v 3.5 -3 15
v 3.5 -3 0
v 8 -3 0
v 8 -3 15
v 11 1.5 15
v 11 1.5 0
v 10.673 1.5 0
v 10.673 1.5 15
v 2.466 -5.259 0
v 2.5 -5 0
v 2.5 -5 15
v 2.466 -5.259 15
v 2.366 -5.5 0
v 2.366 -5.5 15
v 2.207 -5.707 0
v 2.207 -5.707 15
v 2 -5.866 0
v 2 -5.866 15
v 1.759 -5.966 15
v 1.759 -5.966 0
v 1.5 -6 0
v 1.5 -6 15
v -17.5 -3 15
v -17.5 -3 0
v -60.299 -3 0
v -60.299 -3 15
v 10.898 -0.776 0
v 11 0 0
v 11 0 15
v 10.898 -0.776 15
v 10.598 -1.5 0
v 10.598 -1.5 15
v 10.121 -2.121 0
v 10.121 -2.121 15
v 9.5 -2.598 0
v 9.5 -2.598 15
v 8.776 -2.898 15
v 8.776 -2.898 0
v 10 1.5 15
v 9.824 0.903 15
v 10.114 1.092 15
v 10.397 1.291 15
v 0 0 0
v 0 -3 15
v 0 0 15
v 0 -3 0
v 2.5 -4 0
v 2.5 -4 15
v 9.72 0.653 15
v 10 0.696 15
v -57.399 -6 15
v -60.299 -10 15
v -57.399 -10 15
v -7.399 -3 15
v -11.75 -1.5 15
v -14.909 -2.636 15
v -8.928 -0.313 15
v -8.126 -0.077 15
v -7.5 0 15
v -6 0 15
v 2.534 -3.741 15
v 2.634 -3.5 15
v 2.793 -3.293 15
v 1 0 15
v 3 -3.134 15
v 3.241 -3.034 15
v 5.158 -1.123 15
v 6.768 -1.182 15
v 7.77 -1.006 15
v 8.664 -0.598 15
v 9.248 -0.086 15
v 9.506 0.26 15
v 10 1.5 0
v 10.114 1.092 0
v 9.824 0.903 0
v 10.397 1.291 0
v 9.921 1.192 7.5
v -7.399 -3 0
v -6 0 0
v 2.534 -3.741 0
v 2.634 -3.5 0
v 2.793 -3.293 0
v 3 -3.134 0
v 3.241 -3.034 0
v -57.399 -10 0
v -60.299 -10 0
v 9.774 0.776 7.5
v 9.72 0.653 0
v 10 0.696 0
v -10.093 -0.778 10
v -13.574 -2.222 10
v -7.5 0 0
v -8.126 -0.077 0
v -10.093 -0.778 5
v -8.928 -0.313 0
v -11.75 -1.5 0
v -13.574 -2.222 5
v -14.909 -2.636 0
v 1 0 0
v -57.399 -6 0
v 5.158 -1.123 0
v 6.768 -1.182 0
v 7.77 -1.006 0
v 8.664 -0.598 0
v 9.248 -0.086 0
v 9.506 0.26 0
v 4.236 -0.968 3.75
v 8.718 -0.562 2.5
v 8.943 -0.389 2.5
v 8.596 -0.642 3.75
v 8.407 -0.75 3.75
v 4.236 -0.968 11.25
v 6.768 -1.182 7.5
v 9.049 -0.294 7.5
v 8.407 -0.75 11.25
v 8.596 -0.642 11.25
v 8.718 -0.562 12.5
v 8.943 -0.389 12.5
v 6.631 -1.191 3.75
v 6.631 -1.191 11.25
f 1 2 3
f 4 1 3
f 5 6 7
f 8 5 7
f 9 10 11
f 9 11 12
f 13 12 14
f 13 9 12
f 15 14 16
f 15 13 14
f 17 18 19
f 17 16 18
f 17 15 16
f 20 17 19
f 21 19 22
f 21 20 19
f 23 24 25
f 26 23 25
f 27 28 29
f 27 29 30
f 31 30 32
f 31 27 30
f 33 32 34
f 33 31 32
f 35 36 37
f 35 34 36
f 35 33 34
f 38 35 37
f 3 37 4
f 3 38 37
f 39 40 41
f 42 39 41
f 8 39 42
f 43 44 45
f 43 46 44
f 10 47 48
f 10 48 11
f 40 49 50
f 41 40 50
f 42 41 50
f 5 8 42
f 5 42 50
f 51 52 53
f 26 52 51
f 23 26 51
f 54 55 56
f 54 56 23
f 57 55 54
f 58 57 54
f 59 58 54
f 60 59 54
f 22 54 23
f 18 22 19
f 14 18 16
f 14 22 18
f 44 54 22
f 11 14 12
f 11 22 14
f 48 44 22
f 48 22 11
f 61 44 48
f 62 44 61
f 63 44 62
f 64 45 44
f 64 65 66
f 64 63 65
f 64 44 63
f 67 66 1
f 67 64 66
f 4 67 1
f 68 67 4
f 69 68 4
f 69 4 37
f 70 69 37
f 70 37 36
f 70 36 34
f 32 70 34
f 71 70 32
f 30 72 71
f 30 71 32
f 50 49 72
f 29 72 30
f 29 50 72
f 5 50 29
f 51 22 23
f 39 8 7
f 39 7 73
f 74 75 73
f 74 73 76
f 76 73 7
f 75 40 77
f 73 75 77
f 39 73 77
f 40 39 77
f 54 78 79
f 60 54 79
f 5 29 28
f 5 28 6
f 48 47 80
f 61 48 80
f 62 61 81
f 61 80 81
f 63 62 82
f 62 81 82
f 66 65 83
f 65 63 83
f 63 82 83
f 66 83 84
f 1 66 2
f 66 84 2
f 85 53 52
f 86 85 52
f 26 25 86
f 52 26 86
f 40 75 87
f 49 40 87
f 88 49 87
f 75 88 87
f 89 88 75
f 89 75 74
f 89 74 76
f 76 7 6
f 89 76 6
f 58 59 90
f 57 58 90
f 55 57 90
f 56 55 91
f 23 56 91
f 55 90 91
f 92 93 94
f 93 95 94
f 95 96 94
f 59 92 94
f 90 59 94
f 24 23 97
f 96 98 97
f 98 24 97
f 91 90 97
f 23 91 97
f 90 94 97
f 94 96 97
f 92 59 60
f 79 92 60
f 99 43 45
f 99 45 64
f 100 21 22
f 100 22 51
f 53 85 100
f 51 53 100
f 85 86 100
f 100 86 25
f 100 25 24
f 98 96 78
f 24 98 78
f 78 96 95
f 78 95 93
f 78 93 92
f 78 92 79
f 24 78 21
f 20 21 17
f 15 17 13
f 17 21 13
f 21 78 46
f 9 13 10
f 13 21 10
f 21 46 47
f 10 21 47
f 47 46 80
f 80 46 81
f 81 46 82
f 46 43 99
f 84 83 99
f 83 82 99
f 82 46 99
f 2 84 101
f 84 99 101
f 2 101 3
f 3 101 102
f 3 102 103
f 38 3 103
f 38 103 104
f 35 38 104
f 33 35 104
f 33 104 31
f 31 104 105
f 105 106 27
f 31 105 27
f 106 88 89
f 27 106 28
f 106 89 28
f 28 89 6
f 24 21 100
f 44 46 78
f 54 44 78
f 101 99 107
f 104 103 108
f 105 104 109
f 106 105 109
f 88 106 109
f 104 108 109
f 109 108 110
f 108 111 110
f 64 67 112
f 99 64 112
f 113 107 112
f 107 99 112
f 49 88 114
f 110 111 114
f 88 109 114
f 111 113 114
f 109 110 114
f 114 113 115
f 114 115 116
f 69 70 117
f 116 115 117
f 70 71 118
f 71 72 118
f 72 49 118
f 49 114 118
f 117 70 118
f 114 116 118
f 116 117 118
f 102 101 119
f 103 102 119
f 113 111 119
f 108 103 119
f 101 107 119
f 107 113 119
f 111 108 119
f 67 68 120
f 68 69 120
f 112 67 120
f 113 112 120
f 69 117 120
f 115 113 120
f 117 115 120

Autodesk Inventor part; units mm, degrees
ref_plane "YZ Plane" through (0, 0, 0) normal (1, 0, 0) x (0, 1, 0)
ref_plane "XZ Plane" through (0, 0, 0) normal (0, 1, 0) x (-1, 0, 0)
ref_plane "XY Plane" through (0, 0, 0) normal (0, 0, 1) x (1, 0, 0)
sketch "Эскиз1" plane through (0, 0, 0) normal (0, 0, 1) x (1, 0, 0)
  line L0 (0, 0) -> (1, 0)
  line L1 (9, 0) -> (9, -3) construction
  line L2 (9, -3) -> (3.5, -3) construction
  line L3 (0, -3) -> (0, 0)
  line L4 (0, -3) -> (-7.3989, -3)
  line L5 (-7.3989, -3) -> (-7.3989, -6) construction
  line L6 (-7.3989, -6) -> (0, -6)
  line L7 (0, -6) -> (0, -3) construction
  line L8 (0, -3) -> (2.5, -3) construction
  line L9 (2.5, -4) -> (2.5, -5)
  line L10 (1.5, -6) -> (0, -6)
  line L11 (0, -6) -> (0, -3) construction
  line L12 (-7.3989, -3) -> (-6, 0)
  line L13 (-7.3989, -3) -> (-13.5, -3) construction
  line L14 (-57.3989, -3) -> (-57.3989, -6) construction
  line L15 (-57.3989, -6) -> (-7.3989, -6)
  line L16 (-7.3989, -6) -> (-7.3989, -3) construction
  arc A0 (1.5, -6) -> (2.5, -5) centre (1.5, -5) ccw
  arc A1 (3.5, -3) -> (2.5, -4) centre (3.5, -4) ccw
  line L17 (-13.5, -3) -> (-17.5, -3) construction
  line L18 (0, 0) -> (1, 0)
  line L19 (9, 0) -> (8, 0) construction
  arc A2 (1, 0) -> (8, 0) centre (4.5, 9.3675) ccw construction
  line L20 (-57.3989, -3) -> (-60.2989, -3)
  line L21 (-60.2989, -3) -> (-60.2989, -13)
  line L22 (-60.2989, -13) -> (-57.3989, -13) construction
  line L23 (-57.3989, -13) -> (-57.3989, -10) construction
  line L24 (-57.3989, -13) -> (8.6011, -13)
  line L25 (8.6011, -13) -> (8.6011, -10)
  line L26 (8.6011, -10) -> (-57.3989, -10)
  line L27 (-57.3989, -10) -> (-57.3989, -13) construction
  line L28 (-57.3989, -6) -> (-57.3989, -3) construction
  line L29 (-57.3989, -10) -> (-57.3989, -6)
  line L30 (-13.5, -3) -> (-17.5, -3) construction
  line L31 (-17.5, -3) -> (-57.3989, -3)
  line L32 (1, 0) -> (8, 0) construction
  line L33 (8, 0) -> (9, 0) construction
  line L34 (-57.3989, -13) -> (-60.2989, -13)
  line L35 (-60.2989, -13) -> (-60.2989, -13) construction
  line L36 (-6, 0) -> (-7.5, 0) construction
  line L37 (-7.5, 0) -> (-7.5, -3) construction
  line L38 (-7.5, 0) -> (-9.5, 0) construction
  line L39 (-7.5, 0) -> (-9.5, 0) construction
  line L40 (-9.5, 0) -> (-13.5, -3) construction
  line L41 (-13.5, -3) -> (-17.5, -3) construction
  spline S0 degree 3 poles (-7.5, 0) (-9.5, 0) (-13.5, -3) (-17.5, -3) knots 1 1 1 1 2 2 2 2
  line L42 (-7.5, 0) -> (-6, 0)
  line L43 (9, -3) -> (11, -3) construction
  line L44 (11, 0) -> (11, 1.5)
  line L45 (11, 1.5) -> (10.6727, 1.5)
  arc A3 (1, 0) -> (10.6727, 1.5) centre (4.5, 9.3675) ccw
  line L46 (3.5, -3) -> (8, -3)
  arc A4 (8, -3) -> (11, 0) centre (8, 0) ccw
  point P0 (2.5, -6)
  point P1 (0, -6)
  point P2 (2, -4)
  dimension "d0" = 9
  dimension "d1" = 3
  dimension "d3" = 3
  dimension "d4" = 2.5
  dimension "d5" = 3
  dimension "d6" = 50
  dimension "d9" = 1
  dimension "d10" = 1
  dimension "d11" = 4
  dimension "d13" = 3
  dimension "d14" = 1
  dimension "d15" = 1
  dimension "d16" = 10
  dimension "d17" = 2.9
  dimension "d18" = 10
  dimension "d20" = 3
  dimension "d21" = 66
  dimension "d25" = 4
  dimension "d26" = 66
  dimension "d27" = 90
  dimension "d28" = 90
  dimension "d29" = 65
  dimension "d30" = 6
  dimension "d31" = 3
  dimension "d32" = 1.5
  dimension "d33" = 6
  dimension "d34" = 2
  dimension "d37" = 2
  dimension "d38" = 4.5
  dimension "d39" = 3
  dimension "d40" = 2.9
extrude "Выдавливание1" add sketch "Эскиз1" along normal blind 15
sketch "Эскиз3" plane through (0, 0, 15) normal (0, 0, 1) x (1, 0, 0)
  line L0 (-57.3989, -6) -> (1.5, -6) construction
  arc A0 (1.5, -6) -> (2.5, -5) centre (1.5, -5) ccw construction
  arc A1 (3.5, -3) -> (2.5, -4) centre (3.5, -4) ccw construction
  line L1 (1, 0) -> (0, 0) construction
  line L2 (0, 0) -> (0, -3) construction
  line L3 (0, -3) -> (-7.3989, -3) construction
  line L4 (-7.3989, -3) -> (-6, 0) construction
  line L5 (-6, 0) -> (-7.5, 0) construction
  line L6 (-17.5, -3) -> (-60.2989, -3) construction
  line L7 (-60.2989, -3) -> (-60.2989, -13) construction
  line L8 (-60.2989, -13) -> (8.6011, -13) construction
  line L9 (8.6011, -13) -> (8.6011, -10) construction
  line L10 (8.6011, -10) -> (-57.3989, -10) construction
  line L11 (-57.3989, -10) -> (-57.3989, -6) construction
  line L12 (8.6011, -10) -> (-57.3989, -10) construction
  line L13 (-57.3989, -10) -> (-60.2989, -10)
  line L14 (-57.3989, -10) -> (11.5916, -5.7468)
  line L15 (11.5916, -5.7468) -> (11.9856, -17.8215)
  line L16 (11.9856, -17.8215) -> (-64.6581, -17.3068)
  line L17 (-64.6581, -17.3068) -> (-62.6934, -10.3264)
  line L18 (-62.6934, -10.3264) -> (-60.2989, -10)
  line L19 (2.5, -5) -> (2.5, -4) projected
  line L20 (3.5, -3) -> (8, -3) projected
  arc A2 (8, -3) -> (11, 0) centre (8, 0) ccw projected
  line L21 (11, 0) -> (11, 1.5) projected
  line L22 (11, 1.5) -> (10.6727, 1.5) projected
  arc A3 (1, 0) -> (10.6727, 1.5) centre (4.5, 9.3675) ccw projected
extrude "Выдавливание2" cut sketch "Эскиз3" against normal blind 25
sketch "Эскиз4" plane through (0, 0, 15) normal (0, 0, 1) x (1, 0, 0)
  line L0 (-60.2989, -10) -> (-57.3989, -10) construction
  line L1 (-57.3989, -10) -> (-57.3989, -6) construction
  line L2 (-57.3989, -6) -> (1.5, -6) construction
  arc A0 (1.5, -6) -> (2.5, -5) centre (1.5, -5) ccw construction
  line L3 (2.5, -5) -> (2.5, -4) construction
  arc A1 (3.5, -3) -> (2.5, -4) centre (3.5, -4) ccw construction
  line L4 (3.5, -3) -> (8, -3) construction
  arc A2 (8, -3) -> (11, 0) centre (8, 0) ccw construction
  line L5 (11, 0) -> (11, 1.5) construction
  line L6 (11, 1.5) -> (10.6727, 1.5) construction
  arc A3 (1, 0) -> (10.6727, 1.5) centre (4.5, 9.3675) ccw construction
  line L7 (1, 0) -> (0, 0) construction
  line L8 (0, 0) -> (0, -3) construction
  line L9 (0, -3) -> (-7.3989, -3) construction
  line L10 (-7.3989, -3) -> (-6, 0) construction
  line L11 (-6, 0) -> (-7.5, 0) construction
  line L12 (-17.5, -3) -> (-60.2989, -3) construction
  line L13 (-60.2989, -3) -> (-60.2989, -10) construction
  arc A4 (1, 0) -> (10.6727, 1.5) centre (4.5, 9.3675) ccw construction
  line L14 (1, 0) -> (9, -3) construction
  line L15 (9, -3) -> (10.6727, 1.5) construction
  spline S0 degree 2 poles (1, 0) (9, -3) (10.6727, 1.5) knots 1 1 1 2 2 2 construction
  line L16 (1, 0) -> (10.6727, 1.5) construction
  line L17 (11, 1.5) -> (10.6727, 1.5) projected
  line L18 (11, 1.5) -> (10, 1.5)
  line L19 (1, 0) -> (9, -3) construction
  line L20 (9, -3) -> (10, 1.5) construction
  spline S1 degree 2 poles (1, 0) (9, -3) (10, 1.5) knots 1 1 1 2 2 2
  line L21 (11, 0) -> (11, 1.5) projected
  line L22 (11, 1.5) -> (10, 0.696)
  line L23 (10, 0.696) -> (9.7197, 0.6526)
  line L24 (1, 0) -> (10, 1.5)
  dimension "d43" = 1
extrude "Выдавливание3" add sketch "Эскиз4" against normal up to surface (15 mm away) contours L22 L23 S1 L18 L17
extrude "Выдавливание4" cut sketch "Эскиз4" against normal up to surface (15 mm away) contours S1 L24
properties part number "bat_lock03_straight"
